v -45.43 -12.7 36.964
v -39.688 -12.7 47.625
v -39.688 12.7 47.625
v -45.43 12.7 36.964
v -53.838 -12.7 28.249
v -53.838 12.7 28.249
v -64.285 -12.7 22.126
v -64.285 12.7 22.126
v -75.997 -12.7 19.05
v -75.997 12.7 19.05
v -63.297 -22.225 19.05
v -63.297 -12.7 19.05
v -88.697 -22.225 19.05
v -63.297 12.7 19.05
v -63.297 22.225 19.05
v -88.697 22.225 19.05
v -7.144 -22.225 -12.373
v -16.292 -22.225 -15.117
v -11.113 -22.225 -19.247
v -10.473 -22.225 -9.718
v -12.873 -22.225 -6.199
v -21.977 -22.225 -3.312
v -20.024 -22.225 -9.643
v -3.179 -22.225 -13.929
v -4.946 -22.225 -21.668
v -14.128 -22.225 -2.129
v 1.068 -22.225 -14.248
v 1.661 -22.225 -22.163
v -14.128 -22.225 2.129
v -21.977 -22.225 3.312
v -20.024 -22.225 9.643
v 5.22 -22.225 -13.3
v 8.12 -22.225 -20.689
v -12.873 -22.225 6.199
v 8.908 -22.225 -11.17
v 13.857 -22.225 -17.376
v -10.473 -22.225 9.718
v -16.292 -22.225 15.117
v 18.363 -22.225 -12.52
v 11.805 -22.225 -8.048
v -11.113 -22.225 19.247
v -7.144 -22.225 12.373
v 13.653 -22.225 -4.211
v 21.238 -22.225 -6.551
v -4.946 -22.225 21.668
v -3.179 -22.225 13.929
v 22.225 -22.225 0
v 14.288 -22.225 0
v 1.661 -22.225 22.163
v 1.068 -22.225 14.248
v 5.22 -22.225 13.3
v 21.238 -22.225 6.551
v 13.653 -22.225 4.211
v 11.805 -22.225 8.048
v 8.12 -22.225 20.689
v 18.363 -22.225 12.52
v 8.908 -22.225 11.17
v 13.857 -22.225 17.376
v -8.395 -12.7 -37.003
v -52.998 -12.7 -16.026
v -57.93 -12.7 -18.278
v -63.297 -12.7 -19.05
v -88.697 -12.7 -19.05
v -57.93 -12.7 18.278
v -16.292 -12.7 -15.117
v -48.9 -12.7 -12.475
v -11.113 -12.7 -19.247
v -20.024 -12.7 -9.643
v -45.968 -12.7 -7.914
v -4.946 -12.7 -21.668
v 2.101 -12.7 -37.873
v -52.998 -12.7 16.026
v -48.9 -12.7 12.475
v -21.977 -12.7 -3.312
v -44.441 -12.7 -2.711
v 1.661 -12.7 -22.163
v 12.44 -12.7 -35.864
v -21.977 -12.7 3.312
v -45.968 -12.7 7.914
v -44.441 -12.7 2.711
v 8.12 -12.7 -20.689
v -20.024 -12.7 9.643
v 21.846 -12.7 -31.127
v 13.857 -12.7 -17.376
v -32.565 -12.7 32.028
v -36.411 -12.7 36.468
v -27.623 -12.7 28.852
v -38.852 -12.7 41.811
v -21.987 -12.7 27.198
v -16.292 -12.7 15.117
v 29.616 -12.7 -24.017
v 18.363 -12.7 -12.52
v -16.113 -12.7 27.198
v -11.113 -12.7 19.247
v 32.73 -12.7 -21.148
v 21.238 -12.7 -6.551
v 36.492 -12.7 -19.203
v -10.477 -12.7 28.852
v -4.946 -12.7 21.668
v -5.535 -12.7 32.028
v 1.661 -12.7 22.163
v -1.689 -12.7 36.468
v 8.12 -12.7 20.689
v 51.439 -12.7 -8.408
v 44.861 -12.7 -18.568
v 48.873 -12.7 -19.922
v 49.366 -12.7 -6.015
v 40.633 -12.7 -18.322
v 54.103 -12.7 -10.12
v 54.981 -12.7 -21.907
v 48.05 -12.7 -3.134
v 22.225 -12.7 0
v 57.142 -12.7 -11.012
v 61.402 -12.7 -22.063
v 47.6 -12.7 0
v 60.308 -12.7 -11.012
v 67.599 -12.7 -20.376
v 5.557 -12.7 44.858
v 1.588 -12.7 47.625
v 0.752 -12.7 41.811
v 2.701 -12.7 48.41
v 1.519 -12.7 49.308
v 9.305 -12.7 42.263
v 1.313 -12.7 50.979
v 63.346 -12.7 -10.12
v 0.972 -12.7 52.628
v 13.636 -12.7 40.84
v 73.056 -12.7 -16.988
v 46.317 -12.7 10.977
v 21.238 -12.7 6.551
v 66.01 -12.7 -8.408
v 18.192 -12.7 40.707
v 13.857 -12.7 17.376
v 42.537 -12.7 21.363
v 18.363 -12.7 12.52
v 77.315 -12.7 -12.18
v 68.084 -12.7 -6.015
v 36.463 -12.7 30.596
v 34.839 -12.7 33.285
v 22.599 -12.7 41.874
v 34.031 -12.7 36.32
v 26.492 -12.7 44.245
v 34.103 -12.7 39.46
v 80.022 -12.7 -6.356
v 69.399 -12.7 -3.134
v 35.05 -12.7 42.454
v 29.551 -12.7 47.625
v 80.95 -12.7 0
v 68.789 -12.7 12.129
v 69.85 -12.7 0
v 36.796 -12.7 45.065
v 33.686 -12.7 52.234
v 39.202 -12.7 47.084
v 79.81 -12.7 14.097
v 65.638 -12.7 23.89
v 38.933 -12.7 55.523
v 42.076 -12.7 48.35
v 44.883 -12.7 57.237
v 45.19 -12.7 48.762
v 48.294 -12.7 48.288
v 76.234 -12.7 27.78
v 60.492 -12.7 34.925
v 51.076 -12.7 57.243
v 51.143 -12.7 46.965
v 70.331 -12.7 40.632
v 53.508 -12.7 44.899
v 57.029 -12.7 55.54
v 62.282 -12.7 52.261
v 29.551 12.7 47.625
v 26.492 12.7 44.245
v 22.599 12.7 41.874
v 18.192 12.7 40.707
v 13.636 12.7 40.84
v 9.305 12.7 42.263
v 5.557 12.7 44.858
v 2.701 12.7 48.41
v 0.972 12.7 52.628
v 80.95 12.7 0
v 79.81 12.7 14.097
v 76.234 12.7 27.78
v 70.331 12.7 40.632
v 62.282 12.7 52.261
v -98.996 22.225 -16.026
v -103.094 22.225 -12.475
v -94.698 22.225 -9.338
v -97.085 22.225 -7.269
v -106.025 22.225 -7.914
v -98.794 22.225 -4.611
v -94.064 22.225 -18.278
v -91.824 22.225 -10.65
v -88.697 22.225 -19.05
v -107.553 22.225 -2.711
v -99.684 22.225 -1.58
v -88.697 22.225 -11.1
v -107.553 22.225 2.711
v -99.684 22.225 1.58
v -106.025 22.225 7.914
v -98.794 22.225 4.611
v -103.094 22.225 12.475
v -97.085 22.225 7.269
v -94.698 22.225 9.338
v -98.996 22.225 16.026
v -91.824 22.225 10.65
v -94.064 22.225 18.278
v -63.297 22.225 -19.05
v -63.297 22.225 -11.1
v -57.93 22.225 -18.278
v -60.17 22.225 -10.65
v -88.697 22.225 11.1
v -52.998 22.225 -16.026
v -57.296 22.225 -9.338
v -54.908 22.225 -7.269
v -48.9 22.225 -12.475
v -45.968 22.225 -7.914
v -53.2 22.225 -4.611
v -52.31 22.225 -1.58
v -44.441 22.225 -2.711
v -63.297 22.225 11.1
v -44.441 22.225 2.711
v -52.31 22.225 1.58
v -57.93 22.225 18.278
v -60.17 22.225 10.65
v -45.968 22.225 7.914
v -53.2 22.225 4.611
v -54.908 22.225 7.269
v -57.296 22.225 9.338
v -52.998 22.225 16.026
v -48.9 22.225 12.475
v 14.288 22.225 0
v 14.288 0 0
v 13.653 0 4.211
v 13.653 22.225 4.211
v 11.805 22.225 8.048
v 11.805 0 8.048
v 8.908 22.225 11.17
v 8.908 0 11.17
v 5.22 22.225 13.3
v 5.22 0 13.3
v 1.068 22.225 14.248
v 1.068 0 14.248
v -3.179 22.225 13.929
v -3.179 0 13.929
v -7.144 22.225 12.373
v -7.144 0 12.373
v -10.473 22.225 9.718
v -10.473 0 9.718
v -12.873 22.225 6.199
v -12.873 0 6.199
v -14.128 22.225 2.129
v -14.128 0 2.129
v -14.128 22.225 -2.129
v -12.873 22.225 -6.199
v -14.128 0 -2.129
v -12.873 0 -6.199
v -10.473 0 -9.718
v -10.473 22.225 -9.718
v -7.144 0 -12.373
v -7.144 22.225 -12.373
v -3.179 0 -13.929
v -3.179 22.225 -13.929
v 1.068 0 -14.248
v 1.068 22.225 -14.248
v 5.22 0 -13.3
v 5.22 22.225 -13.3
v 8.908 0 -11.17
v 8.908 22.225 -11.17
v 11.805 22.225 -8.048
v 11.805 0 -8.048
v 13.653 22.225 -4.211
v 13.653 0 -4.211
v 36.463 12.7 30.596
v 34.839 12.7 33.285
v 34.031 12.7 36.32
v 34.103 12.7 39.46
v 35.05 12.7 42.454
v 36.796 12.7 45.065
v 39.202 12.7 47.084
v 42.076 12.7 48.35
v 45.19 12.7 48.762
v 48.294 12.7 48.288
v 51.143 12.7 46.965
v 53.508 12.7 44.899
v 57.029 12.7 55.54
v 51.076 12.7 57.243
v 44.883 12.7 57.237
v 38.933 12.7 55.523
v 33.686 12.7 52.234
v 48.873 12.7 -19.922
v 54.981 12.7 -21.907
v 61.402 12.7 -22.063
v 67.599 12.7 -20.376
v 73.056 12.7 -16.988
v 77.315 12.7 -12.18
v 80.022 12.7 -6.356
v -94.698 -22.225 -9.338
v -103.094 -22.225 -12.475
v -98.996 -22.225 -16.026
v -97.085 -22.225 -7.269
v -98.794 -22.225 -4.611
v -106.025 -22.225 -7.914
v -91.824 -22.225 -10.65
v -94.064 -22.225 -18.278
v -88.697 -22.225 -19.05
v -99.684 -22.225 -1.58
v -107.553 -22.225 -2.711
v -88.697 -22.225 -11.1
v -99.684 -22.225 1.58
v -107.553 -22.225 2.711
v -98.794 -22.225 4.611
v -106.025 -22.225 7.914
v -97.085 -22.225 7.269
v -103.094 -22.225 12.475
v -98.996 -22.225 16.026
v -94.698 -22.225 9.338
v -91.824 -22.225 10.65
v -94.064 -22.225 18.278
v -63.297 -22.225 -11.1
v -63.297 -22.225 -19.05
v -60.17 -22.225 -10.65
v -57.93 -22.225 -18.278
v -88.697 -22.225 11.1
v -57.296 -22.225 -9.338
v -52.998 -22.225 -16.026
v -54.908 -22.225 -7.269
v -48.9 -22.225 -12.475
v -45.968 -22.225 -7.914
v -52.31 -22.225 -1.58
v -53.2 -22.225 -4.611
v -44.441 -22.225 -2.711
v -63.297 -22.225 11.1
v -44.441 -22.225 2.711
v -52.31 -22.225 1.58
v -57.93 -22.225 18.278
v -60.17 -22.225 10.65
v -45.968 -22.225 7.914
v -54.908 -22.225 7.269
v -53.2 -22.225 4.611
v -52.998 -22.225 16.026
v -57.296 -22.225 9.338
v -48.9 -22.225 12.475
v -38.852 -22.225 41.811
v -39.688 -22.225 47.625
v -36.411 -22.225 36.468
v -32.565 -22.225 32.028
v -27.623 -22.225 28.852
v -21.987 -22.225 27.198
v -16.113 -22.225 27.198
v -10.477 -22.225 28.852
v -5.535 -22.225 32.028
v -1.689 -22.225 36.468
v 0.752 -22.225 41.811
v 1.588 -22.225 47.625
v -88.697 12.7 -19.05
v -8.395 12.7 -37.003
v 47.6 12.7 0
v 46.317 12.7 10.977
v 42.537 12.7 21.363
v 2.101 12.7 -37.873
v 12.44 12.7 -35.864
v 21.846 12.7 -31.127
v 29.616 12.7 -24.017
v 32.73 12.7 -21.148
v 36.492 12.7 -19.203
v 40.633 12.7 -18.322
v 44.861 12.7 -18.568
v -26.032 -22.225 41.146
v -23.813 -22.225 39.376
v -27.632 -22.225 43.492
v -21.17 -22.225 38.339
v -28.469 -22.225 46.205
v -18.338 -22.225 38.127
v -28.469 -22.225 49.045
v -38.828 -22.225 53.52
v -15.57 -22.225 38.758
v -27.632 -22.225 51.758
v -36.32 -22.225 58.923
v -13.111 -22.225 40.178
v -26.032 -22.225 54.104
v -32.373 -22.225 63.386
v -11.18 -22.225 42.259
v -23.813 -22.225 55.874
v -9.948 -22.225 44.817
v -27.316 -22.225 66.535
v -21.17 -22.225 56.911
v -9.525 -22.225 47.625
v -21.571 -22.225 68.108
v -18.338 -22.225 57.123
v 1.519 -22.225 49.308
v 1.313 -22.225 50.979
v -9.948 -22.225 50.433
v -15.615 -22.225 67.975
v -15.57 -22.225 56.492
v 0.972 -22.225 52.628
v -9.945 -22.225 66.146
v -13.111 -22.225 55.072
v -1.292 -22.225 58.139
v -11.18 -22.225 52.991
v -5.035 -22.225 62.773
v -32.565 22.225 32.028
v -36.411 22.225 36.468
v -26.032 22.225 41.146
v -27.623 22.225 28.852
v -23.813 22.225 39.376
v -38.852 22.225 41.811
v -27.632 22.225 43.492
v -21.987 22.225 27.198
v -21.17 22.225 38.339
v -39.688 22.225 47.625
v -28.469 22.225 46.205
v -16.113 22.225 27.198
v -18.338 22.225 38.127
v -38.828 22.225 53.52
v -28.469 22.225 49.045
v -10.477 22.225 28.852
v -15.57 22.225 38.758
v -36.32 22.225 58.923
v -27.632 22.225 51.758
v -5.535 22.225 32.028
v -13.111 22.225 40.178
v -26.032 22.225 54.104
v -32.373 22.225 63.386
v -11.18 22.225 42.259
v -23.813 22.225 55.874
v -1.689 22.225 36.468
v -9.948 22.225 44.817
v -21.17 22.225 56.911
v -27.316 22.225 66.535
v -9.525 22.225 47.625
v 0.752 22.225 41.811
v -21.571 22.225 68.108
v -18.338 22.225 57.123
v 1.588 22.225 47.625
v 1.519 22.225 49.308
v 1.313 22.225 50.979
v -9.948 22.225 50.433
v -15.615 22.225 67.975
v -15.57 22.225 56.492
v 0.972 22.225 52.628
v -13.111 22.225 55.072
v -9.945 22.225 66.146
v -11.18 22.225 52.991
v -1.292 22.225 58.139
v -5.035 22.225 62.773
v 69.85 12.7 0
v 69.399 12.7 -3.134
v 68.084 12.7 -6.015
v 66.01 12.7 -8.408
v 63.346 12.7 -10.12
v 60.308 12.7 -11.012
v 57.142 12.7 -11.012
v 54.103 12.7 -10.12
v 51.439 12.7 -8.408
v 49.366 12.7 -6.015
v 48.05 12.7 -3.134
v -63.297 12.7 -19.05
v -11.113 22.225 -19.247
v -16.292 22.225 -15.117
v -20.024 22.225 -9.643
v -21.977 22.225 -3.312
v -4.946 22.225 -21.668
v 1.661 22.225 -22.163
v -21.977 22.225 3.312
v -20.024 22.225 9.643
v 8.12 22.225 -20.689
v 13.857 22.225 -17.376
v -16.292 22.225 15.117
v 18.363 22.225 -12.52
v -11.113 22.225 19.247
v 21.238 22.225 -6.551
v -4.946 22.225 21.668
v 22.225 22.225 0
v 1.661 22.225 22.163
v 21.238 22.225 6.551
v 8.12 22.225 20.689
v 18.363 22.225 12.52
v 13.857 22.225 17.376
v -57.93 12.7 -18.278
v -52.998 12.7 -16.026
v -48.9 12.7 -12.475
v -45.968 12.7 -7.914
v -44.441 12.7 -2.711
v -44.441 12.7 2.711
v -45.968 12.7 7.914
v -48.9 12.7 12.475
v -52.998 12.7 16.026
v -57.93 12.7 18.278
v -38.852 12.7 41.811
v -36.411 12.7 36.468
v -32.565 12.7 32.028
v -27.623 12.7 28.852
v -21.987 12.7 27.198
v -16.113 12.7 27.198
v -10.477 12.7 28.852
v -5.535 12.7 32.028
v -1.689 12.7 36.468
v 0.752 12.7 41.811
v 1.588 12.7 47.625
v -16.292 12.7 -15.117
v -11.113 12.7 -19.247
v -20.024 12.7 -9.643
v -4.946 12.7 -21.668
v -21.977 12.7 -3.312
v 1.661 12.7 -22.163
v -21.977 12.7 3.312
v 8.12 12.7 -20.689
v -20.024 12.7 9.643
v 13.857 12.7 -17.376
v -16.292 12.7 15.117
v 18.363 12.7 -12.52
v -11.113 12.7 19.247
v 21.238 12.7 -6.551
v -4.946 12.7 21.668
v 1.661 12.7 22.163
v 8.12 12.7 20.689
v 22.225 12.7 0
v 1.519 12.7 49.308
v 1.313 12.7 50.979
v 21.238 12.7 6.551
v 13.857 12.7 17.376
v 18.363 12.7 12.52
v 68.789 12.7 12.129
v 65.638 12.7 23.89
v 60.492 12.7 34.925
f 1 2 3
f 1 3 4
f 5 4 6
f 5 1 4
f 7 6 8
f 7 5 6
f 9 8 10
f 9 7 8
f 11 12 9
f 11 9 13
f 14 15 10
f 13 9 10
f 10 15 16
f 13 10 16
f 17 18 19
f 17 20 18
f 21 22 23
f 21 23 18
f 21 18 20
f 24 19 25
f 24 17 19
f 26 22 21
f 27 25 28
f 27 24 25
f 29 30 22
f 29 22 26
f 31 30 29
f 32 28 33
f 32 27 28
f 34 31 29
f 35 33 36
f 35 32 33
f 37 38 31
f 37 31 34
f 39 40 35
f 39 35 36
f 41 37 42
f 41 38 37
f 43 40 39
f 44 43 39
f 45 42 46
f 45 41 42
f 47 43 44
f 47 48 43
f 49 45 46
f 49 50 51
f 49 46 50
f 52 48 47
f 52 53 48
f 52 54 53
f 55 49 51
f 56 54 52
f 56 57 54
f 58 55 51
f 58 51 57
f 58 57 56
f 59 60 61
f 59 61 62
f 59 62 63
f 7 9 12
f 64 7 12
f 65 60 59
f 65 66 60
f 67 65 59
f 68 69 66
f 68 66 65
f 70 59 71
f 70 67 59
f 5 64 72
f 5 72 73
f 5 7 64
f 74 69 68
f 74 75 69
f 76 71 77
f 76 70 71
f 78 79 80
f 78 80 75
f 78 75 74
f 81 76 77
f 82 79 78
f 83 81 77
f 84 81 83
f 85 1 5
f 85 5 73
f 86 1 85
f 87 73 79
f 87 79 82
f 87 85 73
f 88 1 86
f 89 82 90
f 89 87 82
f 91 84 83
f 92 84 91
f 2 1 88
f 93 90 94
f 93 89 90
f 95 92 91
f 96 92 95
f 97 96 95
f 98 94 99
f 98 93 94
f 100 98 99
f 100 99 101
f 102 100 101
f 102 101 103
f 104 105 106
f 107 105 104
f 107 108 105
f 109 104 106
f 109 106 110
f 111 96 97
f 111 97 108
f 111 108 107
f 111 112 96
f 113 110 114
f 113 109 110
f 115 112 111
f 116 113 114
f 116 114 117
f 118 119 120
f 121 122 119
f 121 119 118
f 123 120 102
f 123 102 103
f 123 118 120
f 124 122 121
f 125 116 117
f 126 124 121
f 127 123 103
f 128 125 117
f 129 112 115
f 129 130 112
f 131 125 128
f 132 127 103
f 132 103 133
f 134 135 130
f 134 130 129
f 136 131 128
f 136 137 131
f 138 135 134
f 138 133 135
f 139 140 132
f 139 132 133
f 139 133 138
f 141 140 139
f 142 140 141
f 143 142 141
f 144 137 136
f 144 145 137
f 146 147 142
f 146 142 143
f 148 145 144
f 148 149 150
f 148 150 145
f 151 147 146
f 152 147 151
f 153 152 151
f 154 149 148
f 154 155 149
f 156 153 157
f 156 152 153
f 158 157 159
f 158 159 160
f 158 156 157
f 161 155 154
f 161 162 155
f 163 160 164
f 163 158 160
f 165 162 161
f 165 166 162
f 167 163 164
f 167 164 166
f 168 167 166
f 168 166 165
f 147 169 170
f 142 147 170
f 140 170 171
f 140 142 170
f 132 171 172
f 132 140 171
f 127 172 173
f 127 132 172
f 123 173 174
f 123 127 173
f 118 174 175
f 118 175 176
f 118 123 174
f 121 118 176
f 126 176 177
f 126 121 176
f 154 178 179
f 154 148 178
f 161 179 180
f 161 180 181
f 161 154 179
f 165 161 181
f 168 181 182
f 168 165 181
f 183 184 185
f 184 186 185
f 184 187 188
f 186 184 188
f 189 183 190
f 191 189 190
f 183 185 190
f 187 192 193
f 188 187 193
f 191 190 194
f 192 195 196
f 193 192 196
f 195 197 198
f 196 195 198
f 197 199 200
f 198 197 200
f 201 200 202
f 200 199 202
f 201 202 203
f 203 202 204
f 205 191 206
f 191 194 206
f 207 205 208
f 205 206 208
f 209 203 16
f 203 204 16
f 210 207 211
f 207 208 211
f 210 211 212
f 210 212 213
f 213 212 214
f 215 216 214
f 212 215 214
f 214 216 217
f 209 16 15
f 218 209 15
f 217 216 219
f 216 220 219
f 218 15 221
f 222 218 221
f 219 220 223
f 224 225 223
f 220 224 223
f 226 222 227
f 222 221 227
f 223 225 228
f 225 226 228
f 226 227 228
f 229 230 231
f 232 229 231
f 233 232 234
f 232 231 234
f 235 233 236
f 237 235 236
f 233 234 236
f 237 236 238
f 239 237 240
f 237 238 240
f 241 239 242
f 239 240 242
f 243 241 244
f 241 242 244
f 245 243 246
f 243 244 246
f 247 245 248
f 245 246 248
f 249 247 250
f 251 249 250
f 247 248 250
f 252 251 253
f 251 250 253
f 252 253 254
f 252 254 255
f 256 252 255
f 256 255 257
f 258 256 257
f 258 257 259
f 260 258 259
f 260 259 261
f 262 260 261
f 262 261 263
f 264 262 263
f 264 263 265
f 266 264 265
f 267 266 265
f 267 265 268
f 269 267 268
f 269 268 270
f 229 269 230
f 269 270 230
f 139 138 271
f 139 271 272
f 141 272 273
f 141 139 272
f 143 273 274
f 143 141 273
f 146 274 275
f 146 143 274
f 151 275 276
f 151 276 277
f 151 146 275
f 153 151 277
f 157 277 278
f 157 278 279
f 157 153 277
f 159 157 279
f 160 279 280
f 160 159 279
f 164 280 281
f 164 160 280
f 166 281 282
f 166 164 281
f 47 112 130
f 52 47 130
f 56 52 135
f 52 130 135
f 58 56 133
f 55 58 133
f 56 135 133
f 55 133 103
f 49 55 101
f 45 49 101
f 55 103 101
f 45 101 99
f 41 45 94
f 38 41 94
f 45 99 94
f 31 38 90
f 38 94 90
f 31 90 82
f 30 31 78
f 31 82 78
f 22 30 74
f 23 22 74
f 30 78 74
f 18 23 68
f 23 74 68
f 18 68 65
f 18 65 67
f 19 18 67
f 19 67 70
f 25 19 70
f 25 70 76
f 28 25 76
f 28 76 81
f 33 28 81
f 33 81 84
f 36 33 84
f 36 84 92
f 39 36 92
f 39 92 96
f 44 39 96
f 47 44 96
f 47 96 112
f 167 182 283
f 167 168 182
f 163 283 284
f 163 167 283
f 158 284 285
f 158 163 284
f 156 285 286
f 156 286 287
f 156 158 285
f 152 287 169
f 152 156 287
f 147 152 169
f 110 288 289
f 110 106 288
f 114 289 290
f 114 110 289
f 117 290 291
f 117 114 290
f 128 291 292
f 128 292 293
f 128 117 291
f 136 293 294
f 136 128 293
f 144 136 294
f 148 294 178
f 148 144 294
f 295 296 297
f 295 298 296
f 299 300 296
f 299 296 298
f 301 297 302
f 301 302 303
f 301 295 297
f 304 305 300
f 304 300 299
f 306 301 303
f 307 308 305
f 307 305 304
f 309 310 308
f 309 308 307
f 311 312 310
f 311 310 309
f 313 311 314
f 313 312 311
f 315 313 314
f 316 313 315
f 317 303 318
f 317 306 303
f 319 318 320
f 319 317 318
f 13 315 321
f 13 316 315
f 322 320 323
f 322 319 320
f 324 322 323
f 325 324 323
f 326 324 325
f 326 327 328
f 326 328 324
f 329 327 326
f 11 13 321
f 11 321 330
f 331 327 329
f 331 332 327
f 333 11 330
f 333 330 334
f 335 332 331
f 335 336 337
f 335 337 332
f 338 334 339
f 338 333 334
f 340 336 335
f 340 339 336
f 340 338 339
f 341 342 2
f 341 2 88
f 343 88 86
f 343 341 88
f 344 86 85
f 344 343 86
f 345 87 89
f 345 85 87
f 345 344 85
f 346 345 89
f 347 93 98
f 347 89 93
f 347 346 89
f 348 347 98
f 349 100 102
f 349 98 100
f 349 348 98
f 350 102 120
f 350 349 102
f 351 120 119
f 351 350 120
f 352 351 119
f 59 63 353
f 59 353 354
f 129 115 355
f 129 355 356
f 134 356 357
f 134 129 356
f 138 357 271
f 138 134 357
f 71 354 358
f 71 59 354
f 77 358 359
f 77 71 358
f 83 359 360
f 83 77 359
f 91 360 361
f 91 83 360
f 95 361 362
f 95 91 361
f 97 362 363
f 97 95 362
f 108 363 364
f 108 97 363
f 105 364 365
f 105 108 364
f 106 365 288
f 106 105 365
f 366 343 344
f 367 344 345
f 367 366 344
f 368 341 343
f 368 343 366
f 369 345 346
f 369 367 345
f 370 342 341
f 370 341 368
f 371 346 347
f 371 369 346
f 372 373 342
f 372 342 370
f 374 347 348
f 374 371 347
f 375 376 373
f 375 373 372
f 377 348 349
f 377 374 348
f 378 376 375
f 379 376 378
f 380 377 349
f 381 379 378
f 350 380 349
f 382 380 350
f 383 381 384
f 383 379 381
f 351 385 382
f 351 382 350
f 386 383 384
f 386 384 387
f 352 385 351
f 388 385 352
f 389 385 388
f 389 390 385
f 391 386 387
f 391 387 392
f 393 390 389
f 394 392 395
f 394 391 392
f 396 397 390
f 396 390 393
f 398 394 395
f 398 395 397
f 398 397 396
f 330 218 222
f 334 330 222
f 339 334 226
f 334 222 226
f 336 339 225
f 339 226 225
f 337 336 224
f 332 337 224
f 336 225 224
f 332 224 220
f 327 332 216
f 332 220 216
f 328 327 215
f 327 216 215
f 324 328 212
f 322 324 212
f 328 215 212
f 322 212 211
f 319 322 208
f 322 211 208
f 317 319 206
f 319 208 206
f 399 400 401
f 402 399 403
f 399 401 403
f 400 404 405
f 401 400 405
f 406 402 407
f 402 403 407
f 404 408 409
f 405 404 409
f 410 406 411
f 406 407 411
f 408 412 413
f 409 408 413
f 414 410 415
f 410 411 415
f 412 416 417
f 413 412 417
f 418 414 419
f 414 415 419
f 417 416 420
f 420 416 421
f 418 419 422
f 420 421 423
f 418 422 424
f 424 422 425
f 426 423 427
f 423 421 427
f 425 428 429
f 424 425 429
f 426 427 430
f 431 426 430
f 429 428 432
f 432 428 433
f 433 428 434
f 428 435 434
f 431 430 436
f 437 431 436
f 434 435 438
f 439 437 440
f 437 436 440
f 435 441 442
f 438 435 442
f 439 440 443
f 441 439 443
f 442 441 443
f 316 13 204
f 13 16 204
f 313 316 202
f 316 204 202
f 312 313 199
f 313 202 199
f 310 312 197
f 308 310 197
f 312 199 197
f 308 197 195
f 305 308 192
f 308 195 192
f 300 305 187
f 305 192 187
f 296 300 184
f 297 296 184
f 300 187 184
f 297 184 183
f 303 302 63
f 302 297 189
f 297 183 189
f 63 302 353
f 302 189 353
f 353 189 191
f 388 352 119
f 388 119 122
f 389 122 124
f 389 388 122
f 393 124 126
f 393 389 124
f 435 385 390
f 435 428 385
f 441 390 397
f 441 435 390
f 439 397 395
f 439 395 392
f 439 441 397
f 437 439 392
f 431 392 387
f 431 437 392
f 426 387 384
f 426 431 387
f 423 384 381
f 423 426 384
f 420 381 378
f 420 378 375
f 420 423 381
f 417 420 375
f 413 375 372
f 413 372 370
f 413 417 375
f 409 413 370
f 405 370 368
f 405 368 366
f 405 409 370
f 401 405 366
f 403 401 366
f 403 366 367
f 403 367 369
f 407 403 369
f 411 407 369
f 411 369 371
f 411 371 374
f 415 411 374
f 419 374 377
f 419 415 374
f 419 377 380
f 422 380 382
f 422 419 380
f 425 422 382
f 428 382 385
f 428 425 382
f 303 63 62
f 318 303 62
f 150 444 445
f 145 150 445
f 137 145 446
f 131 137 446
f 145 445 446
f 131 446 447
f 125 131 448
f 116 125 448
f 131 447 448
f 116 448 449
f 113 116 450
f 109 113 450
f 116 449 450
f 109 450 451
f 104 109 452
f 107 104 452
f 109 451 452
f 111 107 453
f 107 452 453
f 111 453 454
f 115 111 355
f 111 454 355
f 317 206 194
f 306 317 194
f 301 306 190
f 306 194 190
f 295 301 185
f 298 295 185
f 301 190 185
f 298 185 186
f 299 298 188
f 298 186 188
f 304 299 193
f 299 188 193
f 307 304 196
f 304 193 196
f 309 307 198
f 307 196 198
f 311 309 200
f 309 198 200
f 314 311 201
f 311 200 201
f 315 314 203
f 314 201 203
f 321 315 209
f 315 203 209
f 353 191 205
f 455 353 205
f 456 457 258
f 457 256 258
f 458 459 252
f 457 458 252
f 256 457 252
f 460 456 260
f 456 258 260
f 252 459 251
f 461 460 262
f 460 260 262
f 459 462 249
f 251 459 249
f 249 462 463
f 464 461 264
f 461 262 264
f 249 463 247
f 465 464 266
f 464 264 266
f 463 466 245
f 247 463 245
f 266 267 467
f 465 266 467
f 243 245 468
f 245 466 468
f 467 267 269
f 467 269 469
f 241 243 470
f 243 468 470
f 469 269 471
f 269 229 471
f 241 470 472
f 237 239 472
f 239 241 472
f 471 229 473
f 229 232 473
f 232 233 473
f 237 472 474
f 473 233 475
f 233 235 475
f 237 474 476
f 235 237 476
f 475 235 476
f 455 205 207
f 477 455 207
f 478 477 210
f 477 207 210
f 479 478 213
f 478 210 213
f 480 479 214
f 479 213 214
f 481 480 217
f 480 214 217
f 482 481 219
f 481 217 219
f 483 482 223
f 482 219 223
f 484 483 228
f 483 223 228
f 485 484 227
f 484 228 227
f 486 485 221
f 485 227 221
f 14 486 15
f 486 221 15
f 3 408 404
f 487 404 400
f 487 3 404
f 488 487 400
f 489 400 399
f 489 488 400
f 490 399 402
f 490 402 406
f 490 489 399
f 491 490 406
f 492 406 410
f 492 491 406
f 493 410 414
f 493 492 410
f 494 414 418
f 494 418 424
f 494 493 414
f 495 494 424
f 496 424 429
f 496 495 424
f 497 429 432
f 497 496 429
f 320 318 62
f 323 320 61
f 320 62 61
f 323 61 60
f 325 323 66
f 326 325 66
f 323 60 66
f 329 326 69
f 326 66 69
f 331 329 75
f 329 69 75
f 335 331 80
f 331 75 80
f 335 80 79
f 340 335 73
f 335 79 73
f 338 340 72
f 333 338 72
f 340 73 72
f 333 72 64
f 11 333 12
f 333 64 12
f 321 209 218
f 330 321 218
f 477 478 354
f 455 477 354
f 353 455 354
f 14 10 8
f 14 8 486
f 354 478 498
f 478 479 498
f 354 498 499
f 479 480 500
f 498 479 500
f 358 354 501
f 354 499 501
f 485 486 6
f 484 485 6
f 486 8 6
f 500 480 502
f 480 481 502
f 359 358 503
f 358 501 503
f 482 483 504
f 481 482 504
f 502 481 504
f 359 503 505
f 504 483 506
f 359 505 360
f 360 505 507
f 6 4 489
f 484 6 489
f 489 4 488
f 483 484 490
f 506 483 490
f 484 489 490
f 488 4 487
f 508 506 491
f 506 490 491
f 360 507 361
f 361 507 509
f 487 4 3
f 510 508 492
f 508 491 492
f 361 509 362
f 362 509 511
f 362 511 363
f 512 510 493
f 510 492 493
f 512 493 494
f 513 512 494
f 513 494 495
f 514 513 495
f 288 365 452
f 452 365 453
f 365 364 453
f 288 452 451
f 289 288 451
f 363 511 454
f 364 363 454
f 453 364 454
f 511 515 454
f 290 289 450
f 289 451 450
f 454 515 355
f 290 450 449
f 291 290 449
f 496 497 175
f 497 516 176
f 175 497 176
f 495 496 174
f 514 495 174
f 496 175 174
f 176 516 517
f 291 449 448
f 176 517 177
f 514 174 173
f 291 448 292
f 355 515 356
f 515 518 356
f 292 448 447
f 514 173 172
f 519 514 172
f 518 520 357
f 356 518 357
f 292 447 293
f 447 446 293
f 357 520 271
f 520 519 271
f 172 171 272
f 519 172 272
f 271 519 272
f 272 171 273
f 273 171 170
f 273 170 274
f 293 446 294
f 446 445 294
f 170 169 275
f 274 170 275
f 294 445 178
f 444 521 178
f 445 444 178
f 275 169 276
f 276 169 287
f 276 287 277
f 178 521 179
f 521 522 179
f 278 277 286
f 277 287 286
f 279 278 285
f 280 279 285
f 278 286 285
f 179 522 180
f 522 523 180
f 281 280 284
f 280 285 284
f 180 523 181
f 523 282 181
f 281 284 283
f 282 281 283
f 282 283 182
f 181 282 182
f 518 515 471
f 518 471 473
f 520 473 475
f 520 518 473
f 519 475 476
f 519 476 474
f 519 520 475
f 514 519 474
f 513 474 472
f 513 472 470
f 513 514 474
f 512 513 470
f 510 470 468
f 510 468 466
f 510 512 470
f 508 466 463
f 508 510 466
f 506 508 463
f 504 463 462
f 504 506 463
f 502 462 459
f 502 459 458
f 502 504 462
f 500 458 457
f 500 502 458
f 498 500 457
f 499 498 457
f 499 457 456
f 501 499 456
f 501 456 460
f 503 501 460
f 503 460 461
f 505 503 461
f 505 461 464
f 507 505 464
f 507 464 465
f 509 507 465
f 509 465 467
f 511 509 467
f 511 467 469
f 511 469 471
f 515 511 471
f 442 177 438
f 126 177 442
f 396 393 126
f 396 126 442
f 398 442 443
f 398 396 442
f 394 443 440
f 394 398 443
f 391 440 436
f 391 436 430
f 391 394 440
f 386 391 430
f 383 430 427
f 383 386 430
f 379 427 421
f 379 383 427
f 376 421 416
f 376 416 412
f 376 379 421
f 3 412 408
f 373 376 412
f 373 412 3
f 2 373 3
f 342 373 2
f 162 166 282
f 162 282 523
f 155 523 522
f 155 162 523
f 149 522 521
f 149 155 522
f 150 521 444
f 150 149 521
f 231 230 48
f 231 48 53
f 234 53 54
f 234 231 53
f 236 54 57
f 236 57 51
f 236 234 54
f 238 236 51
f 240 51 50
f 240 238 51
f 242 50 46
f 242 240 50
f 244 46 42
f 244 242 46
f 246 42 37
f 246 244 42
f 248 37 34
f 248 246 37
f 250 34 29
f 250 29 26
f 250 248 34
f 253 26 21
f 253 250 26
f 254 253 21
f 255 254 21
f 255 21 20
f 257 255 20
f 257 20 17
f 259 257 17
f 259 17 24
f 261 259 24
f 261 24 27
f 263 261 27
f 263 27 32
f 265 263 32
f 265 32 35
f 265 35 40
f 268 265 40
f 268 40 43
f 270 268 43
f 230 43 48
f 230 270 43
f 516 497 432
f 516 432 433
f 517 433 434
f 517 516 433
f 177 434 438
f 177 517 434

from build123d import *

# Parameters (mm, degrees)
F0_R     = 22.225
F1_DEPTH = 12.7
F0_R_2   = 14.2875
F0_R_3   = 9.525
F2_DEPTH = 22.225


with BuildPart() as f1:
    # F0 (on Front) → F1 (new body, symmetric)
    with BuildSketch(Plane.XZ):
        with BuildLine():
            ThreePointArc((0.971786, 52.628446), (1.432993, 50.145594), (1.5875, 47.625))
            ThreePointArc((1.5875, 47.625), (-19.05, 26.9875), (-39.6875, 47.625))
            ThreePointArc((-39.6875, 47.625), (-53.837568, 28.249011), (-75.9968, 19.05))
            Line((-75.9968, 19.05), (-63.2968, 19.05))
            ThreePointArc((-63.2968, 19.05), (-44.2468, 0), (-63.2968, -19.05))
            Line((-63.2968, -19.05), (-88.6968, -19.05))
            Line((-88.6968, -19.05), (-8.395337, -37.002993))
            ThreePointArc((-8.395337, -37.002993), (12.439533, -35.863776), (29.616348, -24.016978))
            ThreePointArc((29.616348, -24.016978), (38.533005, -18.624111), (48.872514, -19.921925))
            ThreePointArc((48.872514, -19.921925), (70.450489, -18.880117), (80.9498, 0))
            ThreePointArc((80.9498, 0), (76.233903, 27.779937), (62.281711, 52.26056))
            ThreePointArc((62.281711, 52.26056), (44.883221, 57.23725), (29.550918, 47.625))
            ThreePointArc((29.550918, 47.625), (13.635509, 40.840087), (0.971786, 52.628446))
        make_face()
        Circle(F0_R, mode=Mode.SUBTRACT)
        with BuildLine():
            ThreePointArc((69.85, 0), (58.7248, -11.1252), (47.5996, 0))
            ThreePointArc((47.5996, 0), (44.728993, 16.280022), (36.463409, 30.596433))
            ThreePointArc((36.463409, 30.596433), (37.92717, 46.15973), (53.508204, 44.898715))
            ThreePointArc((53.508204, 44.898715), (65.63753, 23.890107), (69.85, 0))
        make_face(mode=Mode.SUBTRACT)
    extrude(amount=F1_DEPTH, both=True)

    # F0 (on Front) → F2 (join, symmetric)
    with BuildSketch(Plane.XZ):
        Circle(F0_R)
        Circle(F0_R_2, mode=Mode.SUBTRACT)
        with BuildLine():
            Line((-63.2968, 19.05), (-75.9968, 19.05))
            Line((-75.9968, 19.05), (-88.6968, 19.05))
            ThreePointArc((-88.6968, 19.05), (-107.7468, 0), (-88.6968, -19.05))
            Line((-88.6968, -19.05), (-63.2968, -19.05))
            ThreePointArc((-63.2968, -19.05), (-44.2468, 0), (-63.2968, 19.05))
        make_face()
        with BuildLine():
            ThreePointArc((-88.6968, -11.0998), (-99.7966, 0), (-88.6968, 11.0998))
            Line((-88.6968, 11.0998), (-63.2968, 11.0998))
            ThreePointArc((-63.2968, 11.0998), (-52.197, 0), (-63.2968, -11.0998))
            Line((-63.2968, -11.0998), (-88.6968, -11.0998))
        make_face(mode=Mode.SUBTRACT)
        with BuildLine():
            ThreePointArc((-39.6875, 47.625), (-19.05, 26.9875), (1.5875, 47.625))
            ThreePointArc((1.5875, 47.625), (1.432993, 50.145594), (0.971786, 52.628446))
            ThreePointArc((0.971786, 52.628446), (-21.570594, 68.107993), (-39.6875, 47.625))
        make_face()
        with Locations((-19.05, 47.625)):
            Circle(F0_R_3, mode=Mode.SUBTRACT)
    extrude(amount=F2_DEPTH, both=True)


solid = f1.part
